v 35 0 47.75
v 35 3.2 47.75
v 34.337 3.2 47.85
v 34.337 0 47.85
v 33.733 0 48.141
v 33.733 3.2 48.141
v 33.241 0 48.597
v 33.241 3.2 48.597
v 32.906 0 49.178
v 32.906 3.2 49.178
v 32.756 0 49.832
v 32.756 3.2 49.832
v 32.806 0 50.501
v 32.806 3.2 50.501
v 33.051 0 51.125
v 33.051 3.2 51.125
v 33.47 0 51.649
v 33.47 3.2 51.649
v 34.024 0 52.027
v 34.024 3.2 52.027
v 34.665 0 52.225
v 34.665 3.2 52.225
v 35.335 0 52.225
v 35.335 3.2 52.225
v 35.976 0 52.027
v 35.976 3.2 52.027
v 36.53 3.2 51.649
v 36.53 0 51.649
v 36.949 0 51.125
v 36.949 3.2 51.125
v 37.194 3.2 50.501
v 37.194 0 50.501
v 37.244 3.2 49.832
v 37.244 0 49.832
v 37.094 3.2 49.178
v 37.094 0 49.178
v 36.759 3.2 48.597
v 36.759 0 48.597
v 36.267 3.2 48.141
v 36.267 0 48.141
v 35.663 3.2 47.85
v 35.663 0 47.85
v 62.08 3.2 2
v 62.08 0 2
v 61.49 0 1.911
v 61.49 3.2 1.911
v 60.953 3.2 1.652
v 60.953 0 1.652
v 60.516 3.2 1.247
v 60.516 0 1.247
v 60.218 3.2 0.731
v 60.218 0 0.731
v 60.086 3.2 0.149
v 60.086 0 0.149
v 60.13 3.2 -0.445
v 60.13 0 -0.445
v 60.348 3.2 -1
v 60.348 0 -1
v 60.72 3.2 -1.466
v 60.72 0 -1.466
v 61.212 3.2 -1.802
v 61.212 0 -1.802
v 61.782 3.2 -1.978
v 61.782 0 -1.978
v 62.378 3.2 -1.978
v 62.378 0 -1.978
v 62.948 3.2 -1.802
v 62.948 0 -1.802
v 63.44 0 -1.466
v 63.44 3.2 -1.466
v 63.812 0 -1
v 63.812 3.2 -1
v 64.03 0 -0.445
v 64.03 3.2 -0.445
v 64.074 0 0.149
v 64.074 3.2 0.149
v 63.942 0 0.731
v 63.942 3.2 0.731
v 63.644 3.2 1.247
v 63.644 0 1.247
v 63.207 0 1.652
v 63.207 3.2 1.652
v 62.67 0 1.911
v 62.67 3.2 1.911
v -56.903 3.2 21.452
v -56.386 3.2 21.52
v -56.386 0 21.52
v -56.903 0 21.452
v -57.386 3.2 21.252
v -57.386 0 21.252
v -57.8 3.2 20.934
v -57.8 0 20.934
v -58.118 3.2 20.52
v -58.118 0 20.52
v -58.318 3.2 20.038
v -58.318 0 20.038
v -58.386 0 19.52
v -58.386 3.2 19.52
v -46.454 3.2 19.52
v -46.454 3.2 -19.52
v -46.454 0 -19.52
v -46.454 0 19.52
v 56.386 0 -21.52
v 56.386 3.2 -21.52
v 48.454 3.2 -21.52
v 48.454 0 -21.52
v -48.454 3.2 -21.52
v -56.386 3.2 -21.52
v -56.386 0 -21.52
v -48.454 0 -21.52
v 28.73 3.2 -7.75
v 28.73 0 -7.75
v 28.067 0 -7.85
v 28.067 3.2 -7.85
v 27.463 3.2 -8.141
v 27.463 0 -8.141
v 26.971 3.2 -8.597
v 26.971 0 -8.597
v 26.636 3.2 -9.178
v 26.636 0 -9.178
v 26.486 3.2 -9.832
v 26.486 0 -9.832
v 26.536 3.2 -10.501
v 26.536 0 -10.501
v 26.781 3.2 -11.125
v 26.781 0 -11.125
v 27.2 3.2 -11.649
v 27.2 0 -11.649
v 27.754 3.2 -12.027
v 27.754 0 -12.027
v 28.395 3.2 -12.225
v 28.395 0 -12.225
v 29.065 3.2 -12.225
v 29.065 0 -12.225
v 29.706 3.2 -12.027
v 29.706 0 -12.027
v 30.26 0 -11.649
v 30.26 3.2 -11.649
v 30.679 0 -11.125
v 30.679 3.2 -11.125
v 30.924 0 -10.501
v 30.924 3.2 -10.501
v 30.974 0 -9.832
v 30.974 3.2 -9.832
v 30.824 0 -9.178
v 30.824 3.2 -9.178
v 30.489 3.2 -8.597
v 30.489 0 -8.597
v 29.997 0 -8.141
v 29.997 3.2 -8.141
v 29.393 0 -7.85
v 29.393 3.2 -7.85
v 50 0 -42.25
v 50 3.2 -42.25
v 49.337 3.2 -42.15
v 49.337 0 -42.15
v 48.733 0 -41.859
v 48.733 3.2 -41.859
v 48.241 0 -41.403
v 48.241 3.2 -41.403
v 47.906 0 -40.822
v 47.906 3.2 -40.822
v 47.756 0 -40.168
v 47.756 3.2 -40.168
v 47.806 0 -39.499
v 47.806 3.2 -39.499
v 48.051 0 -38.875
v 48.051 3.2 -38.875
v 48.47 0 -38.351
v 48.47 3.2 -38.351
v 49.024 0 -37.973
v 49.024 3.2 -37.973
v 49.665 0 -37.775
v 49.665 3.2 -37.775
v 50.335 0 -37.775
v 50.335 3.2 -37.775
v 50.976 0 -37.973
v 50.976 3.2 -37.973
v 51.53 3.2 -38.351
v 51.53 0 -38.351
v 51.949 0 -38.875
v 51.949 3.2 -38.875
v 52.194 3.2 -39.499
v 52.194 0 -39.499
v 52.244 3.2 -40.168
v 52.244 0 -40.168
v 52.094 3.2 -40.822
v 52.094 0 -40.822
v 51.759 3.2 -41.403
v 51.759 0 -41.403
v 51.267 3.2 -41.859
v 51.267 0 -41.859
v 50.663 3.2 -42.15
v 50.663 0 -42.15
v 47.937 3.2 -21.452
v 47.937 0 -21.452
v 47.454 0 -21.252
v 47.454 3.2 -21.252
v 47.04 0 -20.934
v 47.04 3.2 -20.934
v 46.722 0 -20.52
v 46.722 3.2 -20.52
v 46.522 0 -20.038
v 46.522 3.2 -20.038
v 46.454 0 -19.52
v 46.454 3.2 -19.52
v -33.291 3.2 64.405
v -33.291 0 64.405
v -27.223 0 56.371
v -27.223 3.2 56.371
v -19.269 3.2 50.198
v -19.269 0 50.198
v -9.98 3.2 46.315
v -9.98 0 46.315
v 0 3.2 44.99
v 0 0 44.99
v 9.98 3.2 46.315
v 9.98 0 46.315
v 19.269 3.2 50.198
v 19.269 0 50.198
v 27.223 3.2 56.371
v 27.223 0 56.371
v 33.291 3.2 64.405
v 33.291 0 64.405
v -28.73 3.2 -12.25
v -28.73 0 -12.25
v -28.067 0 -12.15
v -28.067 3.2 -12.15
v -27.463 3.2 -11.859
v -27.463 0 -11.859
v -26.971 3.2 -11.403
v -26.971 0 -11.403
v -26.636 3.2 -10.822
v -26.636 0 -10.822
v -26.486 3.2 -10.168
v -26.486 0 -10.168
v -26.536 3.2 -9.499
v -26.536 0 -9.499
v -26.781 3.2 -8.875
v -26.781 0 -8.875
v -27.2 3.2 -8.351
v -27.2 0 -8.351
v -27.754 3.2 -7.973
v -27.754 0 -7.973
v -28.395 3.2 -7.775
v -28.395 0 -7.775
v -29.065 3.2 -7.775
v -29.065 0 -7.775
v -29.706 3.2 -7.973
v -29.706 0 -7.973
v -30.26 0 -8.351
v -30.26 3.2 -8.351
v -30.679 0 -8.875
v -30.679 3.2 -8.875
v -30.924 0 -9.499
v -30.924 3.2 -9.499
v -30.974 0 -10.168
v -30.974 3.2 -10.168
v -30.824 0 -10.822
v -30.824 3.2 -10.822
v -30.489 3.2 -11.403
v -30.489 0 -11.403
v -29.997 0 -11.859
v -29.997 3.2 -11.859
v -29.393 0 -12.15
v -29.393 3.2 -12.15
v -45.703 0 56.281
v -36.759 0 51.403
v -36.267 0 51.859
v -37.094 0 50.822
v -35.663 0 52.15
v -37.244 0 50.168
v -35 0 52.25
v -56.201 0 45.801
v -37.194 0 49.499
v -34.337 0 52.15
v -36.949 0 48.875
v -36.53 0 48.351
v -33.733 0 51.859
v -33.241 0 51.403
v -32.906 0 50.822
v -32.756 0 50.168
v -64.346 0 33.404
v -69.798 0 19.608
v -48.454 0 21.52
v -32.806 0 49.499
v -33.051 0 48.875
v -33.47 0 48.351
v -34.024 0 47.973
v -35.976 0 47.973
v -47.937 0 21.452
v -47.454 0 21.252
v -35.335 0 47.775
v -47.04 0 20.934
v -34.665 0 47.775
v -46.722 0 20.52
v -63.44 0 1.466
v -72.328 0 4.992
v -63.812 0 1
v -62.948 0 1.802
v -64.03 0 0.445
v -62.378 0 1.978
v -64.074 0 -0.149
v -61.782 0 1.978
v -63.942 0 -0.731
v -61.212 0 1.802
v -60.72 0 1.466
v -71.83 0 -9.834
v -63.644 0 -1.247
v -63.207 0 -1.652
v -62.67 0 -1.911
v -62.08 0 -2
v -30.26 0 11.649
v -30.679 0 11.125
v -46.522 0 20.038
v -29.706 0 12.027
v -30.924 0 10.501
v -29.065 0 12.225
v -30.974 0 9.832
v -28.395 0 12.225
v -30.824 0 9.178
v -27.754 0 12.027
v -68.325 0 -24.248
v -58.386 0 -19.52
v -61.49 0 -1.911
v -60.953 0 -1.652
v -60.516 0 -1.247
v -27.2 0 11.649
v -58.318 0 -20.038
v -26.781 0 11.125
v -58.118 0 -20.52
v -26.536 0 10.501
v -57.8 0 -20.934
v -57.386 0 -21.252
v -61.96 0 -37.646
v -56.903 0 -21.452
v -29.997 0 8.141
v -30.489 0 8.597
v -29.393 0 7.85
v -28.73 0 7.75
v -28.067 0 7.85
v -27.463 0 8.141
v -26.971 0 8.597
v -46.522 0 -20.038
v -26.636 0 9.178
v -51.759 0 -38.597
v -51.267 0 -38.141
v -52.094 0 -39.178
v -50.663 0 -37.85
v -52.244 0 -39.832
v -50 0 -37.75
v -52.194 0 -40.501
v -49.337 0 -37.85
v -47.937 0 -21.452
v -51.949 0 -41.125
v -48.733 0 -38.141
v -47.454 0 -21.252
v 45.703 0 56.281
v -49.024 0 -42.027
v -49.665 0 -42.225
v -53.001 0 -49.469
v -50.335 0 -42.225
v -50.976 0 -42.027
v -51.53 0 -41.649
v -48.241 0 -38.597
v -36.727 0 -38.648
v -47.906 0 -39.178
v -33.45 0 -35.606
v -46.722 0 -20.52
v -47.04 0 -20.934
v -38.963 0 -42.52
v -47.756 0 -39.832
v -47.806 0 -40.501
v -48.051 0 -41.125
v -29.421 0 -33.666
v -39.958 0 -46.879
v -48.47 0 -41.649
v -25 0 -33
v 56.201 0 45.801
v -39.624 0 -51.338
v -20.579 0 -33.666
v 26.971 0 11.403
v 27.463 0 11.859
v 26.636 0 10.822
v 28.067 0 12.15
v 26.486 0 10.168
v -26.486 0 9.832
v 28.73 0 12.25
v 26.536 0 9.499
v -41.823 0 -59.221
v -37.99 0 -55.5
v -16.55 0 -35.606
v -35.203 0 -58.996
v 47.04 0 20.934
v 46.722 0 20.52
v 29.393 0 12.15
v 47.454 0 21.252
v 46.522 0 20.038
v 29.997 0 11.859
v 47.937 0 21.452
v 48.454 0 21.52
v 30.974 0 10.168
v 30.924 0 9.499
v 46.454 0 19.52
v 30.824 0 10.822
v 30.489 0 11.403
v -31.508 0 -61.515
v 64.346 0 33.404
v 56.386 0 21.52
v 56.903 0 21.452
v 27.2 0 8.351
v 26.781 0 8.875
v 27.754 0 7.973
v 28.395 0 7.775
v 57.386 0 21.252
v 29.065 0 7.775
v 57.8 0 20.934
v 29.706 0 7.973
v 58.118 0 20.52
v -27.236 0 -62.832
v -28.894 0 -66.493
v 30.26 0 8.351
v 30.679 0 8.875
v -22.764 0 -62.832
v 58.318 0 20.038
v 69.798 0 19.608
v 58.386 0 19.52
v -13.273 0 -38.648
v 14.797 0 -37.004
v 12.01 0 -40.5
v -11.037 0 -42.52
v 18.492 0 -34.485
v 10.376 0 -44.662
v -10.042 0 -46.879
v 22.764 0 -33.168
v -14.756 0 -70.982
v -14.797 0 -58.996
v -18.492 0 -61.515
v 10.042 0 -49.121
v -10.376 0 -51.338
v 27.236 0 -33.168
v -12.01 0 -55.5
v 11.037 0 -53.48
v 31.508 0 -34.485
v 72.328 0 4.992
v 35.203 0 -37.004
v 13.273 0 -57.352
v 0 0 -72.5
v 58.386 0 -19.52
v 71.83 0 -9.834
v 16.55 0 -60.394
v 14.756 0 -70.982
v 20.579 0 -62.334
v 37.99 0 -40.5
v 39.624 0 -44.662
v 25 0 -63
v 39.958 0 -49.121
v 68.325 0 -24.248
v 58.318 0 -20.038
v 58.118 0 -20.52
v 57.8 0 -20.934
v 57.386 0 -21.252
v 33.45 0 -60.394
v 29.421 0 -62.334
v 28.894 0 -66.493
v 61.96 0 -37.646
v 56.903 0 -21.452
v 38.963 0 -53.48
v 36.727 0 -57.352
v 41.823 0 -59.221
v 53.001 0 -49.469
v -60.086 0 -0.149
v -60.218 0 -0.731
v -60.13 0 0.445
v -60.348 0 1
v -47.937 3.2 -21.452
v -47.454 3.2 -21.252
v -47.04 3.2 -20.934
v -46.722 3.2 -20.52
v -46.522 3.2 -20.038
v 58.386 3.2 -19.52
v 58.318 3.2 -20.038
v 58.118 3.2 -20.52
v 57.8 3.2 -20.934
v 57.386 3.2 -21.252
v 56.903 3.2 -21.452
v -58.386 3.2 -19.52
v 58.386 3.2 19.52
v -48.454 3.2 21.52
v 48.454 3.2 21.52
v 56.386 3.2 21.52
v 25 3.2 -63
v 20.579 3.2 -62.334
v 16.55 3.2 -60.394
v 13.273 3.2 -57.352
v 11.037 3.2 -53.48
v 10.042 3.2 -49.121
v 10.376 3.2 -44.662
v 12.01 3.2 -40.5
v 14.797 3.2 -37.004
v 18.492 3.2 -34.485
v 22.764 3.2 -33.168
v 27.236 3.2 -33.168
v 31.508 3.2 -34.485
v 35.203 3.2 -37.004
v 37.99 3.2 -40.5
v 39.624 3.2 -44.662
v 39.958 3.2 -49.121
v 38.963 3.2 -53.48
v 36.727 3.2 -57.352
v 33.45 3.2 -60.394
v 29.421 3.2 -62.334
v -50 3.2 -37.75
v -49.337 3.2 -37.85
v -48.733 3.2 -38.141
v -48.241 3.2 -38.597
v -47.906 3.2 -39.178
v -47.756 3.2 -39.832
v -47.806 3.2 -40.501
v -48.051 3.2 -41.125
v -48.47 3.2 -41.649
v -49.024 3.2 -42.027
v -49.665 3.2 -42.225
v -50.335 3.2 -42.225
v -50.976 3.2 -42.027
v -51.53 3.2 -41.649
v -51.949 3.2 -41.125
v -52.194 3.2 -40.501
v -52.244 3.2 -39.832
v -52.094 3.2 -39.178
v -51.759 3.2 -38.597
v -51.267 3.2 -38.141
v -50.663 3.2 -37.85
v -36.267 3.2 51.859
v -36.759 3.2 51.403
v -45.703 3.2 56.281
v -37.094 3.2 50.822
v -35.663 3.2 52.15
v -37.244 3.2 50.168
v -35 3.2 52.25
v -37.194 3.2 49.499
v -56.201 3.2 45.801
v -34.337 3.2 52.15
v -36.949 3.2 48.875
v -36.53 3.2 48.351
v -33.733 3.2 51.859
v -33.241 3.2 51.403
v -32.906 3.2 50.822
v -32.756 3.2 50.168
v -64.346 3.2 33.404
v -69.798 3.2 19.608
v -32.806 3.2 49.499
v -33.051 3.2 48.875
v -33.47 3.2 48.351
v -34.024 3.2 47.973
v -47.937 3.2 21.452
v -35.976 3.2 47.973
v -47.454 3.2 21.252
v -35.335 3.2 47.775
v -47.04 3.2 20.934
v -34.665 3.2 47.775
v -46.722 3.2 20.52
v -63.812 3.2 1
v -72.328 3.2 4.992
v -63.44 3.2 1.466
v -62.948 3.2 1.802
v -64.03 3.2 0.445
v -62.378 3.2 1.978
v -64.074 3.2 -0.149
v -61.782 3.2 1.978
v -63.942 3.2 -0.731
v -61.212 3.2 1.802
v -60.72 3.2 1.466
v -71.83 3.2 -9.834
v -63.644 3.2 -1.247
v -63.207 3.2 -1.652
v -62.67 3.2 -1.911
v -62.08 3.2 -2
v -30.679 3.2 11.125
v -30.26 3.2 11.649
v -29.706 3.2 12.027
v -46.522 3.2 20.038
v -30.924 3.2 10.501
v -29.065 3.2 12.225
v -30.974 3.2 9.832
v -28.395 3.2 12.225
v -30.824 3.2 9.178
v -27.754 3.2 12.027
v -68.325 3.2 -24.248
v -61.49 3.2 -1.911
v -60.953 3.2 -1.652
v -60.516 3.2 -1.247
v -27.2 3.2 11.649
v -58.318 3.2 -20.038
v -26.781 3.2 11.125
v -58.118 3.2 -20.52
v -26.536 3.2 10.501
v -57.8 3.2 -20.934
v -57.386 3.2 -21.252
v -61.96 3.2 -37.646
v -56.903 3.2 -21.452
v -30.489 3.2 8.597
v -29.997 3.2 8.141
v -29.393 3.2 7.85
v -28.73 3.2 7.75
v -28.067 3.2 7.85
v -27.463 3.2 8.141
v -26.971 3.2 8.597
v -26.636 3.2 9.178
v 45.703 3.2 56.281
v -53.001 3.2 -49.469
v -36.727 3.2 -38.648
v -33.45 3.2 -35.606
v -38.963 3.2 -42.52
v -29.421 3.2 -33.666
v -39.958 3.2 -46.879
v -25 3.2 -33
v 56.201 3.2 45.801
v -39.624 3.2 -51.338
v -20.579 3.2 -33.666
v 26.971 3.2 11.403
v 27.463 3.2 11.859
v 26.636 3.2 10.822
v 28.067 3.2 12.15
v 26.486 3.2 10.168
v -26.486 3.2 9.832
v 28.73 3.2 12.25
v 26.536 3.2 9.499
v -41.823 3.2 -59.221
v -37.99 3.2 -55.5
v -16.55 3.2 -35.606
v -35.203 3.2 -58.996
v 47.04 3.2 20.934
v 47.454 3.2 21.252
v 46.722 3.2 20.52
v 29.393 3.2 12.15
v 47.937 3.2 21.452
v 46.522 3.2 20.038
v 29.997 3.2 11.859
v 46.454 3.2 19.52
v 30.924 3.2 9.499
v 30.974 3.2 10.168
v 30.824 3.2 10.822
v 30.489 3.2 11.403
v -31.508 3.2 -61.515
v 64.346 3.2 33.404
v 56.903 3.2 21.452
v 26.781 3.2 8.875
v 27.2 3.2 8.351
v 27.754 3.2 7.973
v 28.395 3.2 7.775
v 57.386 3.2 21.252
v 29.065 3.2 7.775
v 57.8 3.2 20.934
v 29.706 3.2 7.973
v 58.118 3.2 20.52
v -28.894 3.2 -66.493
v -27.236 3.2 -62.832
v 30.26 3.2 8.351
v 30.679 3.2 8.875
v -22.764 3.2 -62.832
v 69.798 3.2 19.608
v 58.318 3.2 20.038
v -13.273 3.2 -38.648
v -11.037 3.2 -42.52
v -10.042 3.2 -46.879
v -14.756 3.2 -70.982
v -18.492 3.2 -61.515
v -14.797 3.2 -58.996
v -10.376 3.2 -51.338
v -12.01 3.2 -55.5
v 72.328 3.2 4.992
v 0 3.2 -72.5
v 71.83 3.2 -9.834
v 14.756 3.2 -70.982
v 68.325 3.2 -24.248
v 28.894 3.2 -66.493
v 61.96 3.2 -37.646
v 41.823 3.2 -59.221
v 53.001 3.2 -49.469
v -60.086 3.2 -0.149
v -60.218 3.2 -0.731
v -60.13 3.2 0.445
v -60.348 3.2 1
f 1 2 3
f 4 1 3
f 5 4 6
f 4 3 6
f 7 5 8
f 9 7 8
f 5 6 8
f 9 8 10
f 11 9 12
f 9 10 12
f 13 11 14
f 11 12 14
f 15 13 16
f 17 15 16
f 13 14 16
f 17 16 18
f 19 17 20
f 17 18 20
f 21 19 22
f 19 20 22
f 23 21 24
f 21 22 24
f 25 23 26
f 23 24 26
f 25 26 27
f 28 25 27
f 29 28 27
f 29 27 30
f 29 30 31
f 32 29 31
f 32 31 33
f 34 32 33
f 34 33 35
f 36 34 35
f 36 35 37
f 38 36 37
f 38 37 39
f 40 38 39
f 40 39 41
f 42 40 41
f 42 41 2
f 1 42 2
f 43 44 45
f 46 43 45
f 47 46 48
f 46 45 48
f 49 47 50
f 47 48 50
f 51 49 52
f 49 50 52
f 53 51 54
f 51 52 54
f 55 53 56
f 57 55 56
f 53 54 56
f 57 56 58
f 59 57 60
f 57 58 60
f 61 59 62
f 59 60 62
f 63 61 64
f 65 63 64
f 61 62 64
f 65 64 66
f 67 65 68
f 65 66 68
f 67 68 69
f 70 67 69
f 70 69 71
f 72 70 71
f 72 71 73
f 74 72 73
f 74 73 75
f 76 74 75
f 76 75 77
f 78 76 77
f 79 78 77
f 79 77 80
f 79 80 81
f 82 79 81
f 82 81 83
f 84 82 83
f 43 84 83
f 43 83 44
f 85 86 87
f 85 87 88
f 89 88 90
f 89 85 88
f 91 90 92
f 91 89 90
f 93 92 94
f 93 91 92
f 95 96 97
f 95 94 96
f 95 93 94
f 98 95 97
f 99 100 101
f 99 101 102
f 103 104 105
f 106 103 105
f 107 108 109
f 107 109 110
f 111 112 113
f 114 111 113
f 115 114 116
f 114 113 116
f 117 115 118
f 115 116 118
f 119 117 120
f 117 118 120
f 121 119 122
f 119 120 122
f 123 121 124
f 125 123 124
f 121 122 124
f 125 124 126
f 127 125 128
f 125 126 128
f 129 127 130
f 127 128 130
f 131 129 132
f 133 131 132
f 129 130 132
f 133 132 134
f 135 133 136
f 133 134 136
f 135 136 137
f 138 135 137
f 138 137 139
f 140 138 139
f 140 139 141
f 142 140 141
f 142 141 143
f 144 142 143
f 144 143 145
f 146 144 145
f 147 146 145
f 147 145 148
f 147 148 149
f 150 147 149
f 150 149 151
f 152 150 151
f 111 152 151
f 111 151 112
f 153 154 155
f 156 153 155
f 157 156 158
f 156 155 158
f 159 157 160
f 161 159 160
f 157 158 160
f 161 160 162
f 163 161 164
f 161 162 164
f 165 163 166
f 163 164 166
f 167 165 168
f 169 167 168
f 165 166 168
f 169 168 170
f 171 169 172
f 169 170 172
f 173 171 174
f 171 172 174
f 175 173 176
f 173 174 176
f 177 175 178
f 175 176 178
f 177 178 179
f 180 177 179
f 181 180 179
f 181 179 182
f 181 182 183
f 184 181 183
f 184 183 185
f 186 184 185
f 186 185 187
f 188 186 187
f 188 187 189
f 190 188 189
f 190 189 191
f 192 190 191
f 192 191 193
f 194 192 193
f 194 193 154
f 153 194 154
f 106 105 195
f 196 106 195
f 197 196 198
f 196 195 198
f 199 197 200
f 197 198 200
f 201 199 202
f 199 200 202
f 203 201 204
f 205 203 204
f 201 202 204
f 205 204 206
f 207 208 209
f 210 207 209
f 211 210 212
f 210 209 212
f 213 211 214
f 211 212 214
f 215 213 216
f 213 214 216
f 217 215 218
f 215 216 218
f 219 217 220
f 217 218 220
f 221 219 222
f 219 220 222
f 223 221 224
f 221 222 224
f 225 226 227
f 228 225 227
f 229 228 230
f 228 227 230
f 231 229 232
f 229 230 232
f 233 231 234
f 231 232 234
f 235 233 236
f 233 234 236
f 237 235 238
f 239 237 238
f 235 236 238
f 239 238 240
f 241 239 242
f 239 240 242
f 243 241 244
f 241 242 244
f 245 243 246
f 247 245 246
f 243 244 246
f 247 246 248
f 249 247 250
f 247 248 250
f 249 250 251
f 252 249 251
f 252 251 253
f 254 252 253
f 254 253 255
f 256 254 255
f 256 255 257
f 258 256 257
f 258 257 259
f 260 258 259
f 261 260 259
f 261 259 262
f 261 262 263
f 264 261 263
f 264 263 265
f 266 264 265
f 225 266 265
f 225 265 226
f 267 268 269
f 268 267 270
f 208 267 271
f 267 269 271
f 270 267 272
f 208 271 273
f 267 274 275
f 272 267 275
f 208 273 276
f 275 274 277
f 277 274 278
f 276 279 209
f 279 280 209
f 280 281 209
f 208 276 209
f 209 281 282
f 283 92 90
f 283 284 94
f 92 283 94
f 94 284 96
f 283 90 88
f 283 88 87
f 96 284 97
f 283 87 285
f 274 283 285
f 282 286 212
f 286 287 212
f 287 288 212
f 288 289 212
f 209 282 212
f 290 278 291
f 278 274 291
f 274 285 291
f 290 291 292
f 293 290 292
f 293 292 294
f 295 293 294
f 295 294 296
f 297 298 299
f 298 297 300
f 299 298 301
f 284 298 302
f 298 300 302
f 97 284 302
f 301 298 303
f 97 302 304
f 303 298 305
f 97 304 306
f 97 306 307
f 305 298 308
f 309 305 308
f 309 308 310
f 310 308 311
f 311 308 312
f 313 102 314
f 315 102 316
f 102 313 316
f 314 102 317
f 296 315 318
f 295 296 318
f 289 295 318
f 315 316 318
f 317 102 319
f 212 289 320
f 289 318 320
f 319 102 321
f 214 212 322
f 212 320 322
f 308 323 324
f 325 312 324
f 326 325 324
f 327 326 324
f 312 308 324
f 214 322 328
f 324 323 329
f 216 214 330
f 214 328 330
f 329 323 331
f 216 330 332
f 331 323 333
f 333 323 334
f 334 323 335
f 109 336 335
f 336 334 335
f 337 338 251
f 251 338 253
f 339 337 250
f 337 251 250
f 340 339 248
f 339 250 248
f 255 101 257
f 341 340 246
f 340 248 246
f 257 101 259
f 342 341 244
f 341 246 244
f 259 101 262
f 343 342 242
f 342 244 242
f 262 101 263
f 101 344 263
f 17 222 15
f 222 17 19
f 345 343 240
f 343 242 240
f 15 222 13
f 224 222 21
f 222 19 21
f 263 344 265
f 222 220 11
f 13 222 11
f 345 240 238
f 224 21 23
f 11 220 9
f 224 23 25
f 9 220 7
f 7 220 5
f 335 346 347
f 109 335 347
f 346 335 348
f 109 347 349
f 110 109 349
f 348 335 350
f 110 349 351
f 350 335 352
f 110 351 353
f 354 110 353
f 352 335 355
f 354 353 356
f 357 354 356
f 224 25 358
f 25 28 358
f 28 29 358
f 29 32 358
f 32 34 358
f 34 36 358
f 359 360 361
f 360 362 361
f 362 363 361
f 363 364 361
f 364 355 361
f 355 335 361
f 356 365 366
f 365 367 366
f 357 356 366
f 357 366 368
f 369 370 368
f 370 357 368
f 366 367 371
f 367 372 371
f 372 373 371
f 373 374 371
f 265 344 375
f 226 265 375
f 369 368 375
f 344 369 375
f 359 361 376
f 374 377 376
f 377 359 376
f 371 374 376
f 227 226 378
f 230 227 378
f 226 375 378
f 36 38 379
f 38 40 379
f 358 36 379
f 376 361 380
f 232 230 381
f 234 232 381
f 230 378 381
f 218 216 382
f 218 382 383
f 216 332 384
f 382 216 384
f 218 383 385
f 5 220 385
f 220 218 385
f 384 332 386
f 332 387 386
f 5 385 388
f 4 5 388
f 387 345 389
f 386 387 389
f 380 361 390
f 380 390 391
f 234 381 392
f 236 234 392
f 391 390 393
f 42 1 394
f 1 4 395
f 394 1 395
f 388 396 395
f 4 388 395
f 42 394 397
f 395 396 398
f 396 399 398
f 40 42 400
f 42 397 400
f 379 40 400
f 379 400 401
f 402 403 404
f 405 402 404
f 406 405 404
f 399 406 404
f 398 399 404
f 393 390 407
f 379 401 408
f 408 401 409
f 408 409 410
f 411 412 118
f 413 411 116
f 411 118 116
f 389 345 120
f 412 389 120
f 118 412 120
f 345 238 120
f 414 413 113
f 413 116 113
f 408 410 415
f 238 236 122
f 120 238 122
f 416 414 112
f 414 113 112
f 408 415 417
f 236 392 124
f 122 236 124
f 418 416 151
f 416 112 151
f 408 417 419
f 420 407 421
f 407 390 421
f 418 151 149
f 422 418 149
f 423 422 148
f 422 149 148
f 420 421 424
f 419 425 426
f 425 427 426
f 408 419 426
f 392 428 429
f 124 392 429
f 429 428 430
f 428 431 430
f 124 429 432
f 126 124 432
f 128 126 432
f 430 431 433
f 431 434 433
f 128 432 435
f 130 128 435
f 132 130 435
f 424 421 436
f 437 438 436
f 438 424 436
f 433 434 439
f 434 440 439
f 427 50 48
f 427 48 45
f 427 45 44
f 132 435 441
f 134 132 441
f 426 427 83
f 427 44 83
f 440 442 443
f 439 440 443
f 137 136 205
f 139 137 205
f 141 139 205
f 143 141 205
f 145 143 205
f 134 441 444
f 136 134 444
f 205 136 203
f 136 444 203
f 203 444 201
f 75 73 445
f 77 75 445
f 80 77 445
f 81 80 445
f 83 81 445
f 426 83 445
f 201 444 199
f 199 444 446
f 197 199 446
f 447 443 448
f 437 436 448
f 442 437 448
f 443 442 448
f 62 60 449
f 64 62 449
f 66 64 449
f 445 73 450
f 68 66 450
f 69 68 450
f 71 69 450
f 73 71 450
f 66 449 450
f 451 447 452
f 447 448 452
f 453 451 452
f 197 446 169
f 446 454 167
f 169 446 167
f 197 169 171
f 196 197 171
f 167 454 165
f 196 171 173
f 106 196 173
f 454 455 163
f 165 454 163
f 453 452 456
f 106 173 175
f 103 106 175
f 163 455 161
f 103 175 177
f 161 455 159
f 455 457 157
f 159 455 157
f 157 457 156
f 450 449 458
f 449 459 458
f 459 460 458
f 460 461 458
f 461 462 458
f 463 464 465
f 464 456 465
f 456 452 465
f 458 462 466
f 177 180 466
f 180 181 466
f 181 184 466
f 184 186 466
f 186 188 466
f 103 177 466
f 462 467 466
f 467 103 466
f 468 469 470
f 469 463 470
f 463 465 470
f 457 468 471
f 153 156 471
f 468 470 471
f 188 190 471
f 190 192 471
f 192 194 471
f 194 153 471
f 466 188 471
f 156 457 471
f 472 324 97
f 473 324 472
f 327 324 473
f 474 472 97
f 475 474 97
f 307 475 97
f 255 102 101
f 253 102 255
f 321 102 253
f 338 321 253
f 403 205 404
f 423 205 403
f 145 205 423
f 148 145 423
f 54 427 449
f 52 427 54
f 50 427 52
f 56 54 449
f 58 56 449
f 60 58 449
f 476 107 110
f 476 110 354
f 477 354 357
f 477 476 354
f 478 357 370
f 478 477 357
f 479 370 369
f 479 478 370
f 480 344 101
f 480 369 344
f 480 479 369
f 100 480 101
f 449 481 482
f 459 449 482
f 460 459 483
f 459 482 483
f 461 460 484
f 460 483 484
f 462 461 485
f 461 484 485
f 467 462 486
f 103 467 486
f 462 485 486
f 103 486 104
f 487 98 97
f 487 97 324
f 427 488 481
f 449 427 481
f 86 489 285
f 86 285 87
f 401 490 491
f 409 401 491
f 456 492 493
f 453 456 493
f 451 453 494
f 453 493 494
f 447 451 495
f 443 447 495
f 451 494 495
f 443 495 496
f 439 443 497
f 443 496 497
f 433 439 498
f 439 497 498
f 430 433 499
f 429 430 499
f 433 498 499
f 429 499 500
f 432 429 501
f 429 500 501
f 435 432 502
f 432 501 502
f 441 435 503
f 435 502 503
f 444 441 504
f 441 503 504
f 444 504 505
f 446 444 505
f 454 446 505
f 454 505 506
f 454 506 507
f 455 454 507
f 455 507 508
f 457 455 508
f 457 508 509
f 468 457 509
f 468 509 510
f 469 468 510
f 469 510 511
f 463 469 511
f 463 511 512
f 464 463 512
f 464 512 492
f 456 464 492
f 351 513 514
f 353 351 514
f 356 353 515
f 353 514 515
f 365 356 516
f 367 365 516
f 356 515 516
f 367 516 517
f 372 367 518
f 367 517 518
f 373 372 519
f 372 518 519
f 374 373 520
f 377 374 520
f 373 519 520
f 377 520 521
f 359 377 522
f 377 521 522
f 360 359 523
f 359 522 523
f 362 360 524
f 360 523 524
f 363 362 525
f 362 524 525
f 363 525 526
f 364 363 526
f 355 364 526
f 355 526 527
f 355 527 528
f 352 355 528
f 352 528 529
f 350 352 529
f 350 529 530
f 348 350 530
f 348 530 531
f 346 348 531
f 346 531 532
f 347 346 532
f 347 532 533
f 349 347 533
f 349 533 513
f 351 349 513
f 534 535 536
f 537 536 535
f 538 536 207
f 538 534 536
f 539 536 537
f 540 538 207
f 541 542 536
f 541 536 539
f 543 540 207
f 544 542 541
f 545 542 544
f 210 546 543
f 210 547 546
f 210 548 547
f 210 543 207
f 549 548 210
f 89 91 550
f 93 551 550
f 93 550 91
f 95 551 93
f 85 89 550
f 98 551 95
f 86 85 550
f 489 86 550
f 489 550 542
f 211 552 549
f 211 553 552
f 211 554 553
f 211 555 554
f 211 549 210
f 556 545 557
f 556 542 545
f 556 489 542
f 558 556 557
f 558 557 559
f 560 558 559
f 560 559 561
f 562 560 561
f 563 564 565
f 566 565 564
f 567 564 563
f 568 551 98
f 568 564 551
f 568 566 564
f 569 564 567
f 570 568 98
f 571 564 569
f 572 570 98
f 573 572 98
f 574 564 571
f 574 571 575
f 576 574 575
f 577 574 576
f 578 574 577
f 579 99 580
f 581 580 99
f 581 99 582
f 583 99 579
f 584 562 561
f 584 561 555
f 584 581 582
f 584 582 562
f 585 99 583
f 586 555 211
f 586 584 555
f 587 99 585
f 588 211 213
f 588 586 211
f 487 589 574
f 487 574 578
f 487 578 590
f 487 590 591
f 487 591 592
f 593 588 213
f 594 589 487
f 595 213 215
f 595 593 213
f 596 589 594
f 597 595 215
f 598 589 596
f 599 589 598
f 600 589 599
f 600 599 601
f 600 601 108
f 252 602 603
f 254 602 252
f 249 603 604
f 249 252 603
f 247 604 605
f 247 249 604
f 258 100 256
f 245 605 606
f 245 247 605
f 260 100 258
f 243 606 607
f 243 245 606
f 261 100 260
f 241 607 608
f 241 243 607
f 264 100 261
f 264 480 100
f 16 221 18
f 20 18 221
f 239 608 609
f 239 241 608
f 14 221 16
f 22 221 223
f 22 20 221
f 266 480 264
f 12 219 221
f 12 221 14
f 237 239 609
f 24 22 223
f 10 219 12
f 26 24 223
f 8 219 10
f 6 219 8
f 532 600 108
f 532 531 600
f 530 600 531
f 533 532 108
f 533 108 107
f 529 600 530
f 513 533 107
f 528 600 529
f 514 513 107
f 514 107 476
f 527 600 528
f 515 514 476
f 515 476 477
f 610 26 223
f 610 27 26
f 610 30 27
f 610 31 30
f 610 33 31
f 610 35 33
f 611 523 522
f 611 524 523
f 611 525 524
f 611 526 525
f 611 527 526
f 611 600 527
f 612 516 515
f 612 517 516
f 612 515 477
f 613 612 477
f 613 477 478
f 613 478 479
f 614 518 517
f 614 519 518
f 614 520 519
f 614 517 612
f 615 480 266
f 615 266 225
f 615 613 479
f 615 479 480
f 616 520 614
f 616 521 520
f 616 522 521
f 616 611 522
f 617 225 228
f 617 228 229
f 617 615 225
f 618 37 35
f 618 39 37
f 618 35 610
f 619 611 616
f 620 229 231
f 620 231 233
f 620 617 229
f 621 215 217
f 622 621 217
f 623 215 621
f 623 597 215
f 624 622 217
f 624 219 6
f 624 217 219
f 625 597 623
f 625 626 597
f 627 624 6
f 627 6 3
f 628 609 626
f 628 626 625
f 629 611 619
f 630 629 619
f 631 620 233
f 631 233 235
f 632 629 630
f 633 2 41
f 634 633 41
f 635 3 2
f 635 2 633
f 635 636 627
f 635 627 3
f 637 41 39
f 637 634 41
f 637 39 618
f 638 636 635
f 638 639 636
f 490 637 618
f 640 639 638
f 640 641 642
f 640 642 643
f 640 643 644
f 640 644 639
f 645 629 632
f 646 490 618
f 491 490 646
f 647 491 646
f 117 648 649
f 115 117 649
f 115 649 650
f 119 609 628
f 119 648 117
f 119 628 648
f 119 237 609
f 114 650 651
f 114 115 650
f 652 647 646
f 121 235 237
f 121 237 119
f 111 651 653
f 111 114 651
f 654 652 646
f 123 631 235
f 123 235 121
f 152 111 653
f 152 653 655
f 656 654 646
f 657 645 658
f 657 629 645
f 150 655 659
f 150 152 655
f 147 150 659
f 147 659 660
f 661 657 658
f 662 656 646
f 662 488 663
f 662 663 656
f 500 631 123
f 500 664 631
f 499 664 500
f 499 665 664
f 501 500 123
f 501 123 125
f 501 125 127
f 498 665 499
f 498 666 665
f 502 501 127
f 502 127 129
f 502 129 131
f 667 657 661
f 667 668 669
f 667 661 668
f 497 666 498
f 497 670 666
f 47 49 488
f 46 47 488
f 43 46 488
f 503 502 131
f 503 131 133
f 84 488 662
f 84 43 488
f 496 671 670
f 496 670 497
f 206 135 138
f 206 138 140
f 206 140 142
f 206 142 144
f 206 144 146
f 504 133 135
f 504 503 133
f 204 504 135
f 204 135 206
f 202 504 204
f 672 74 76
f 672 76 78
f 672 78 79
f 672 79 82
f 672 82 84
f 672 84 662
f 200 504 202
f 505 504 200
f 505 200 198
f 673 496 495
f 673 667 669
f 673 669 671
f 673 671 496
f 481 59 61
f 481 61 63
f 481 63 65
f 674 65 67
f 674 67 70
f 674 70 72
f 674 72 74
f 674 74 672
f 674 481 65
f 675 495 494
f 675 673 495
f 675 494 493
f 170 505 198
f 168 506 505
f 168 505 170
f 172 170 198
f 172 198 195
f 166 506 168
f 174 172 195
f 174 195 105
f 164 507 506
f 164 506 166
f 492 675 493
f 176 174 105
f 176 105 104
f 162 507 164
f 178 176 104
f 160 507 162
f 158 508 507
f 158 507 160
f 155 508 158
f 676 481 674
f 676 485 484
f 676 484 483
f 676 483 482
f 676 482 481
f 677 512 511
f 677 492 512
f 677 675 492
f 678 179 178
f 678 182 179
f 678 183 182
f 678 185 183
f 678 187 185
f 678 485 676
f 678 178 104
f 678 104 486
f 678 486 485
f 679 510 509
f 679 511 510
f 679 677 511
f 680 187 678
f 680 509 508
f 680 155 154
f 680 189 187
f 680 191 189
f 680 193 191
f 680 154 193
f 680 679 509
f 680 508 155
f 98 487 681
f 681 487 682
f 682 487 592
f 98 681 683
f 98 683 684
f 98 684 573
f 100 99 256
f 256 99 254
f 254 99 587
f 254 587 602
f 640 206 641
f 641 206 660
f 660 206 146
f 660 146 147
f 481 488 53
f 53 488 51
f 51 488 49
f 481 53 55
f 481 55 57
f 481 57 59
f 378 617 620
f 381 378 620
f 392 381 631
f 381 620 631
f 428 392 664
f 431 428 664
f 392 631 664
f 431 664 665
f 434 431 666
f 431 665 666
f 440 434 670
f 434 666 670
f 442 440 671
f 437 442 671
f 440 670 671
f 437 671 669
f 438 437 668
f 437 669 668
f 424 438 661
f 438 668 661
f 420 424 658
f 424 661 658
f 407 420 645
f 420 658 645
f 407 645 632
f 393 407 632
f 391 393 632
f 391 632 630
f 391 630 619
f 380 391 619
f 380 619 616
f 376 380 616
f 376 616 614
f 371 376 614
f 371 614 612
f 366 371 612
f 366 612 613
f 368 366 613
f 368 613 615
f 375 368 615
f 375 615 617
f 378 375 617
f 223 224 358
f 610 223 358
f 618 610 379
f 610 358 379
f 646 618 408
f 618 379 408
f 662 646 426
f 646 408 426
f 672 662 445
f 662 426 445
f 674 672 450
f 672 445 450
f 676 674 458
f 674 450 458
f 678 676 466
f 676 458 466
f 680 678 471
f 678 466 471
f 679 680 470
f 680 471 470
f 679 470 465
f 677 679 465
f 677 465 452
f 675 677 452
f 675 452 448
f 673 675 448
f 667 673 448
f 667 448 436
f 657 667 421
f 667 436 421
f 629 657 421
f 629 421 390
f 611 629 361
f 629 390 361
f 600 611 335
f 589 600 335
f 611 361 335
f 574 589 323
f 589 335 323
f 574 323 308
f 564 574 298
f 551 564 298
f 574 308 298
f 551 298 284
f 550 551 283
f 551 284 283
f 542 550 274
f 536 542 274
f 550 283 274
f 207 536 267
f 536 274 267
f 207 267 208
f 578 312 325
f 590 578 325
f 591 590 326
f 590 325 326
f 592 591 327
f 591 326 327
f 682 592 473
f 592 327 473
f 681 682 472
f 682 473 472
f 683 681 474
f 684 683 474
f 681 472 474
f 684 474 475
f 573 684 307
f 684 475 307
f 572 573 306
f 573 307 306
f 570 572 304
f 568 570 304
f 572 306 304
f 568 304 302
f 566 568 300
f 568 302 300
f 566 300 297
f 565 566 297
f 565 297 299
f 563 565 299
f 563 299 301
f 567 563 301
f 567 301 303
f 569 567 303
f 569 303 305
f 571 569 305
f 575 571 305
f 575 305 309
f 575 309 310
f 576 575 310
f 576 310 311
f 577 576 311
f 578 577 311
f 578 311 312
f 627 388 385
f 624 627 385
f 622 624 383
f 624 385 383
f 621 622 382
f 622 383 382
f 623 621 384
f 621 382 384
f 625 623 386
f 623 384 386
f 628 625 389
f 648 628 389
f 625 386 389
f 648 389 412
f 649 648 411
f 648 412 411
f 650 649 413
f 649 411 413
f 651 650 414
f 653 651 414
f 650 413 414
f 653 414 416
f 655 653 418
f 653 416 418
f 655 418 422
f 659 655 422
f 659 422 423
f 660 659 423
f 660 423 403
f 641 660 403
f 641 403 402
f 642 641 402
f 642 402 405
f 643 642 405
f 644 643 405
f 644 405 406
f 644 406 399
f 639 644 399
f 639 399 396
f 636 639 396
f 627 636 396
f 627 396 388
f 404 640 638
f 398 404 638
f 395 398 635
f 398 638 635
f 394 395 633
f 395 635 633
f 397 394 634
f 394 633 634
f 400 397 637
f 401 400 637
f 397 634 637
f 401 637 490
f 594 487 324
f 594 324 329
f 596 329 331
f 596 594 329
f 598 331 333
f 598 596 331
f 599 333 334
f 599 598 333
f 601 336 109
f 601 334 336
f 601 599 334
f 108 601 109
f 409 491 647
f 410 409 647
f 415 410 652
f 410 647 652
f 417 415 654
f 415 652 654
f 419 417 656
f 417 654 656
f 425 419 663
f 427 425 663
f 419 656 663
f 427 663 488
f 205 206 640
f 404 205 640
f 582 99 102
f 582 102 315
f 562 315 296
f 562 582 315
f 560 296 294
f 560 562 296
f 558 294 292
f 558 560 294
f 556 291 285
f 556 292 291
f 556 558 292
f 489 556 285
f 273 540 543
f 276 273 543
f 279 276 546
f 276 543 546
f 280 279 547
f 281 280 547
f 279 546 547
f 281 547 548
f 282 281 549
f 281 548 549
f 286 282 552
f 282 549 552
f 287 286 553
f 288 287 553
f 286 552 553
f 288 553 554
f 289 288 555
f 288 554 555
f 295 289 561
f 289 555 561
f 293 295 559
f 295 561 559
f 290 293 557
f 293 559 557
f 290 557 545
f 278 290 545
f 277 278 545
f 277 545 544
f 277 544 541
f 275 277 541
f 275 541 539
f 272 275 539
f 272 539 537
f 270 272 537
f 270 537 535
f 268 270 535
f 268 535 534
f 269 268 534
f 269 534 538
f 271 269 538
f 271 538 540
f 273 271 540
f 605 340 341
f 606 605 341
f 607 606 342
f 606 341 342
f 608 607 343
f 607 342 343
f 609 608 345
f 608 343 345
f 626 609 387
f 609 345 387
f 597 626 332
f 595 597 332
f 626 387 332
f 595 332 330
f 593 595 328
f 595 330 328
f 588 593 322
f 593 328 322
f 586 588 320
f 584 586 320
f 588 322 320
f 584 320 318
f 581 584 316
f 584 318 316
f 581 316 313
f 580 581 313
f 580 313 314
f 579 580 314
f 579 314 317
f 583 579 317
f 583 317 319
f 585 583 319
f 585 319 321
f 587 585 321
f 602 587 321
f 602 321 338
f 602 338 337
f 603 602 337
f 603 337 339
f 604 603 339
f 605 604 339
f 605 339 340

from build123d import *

# Parameters (mm, degrees)
BOSS_EXTRUDE1_DEPTH = 3.2
SKETCH2_W           = 10.76
SKETCH2_H           = 41.868700306
CUT_EXTRUDE1_DEPTH  = 103.580407486
SKETCH3_R           = 2
SKETCH3_R_2         = 2.25
CUT_EXTRUDE2_DEPTH  = 103.580407486
SKETCH4_R           = 15
CUT_EXTRUDE3_DEPTH  = 103.580407486
CUT_EXTRUDE4_DEPTH  = 103.580407486
SKETCH6_R           = 2.25
CUT_EXTRUDE5_DEPTH  = 103.580407486


with BuildPart() as part:
    # Sketch1 → Boss-Extrude1 (new body)
    with BuildSketch(Plane(origin=(0, 0, 0), x_dir=(1, 0, 0), z_dir=(0, 1, 0))):
        with BuildLine():
            ThreePointArc((33.29110537, -64.404598464), (0, 72.5), (-33.29110537, -64.404598464))
            ThreePointArc((-33.29110537, -64.404598464), (0, -44.989799638), (33.29110537, -64.404598464))
        make_face()
    extrude(amount=BOSS_EXTRUDE1_DEPTH)

    # Sketch2 → Cut-Extrude1 (cut, through all)
    with BuildSketch(Plane(origin=(0, 3.2, 0), x_dir=(1, 0, 0), z_dir=(0, 1, 0))):
        with Locations((-52.42, 0)):
            Rectangle(SKETCH2_W, SKETCH2_H)
        with Locations((52.42, 0)):
            Rectangle(SKETCH2_W, SKETCH2_H)
    extrude(amount=-CUT_EXTRUDE1_DEPTH, mode=Mode.SUBTRACT)

    # Sketch3 → Cut-Extrude2 (cut, through all)
    with BuildSketch(Plane.XZ):
        with Locations(Location((-62.08, 0, 0), (0, 0, 270))):
            Circle(SKETCH3_R)
        with Locations(Location((-28.73, 10, 0), (0, 0, 270))):
            Circle(SKETCH3_R_2)
        with Locations(Location((-28.73, -10, 0), (0, 0, 270))):
            Circle(SKETCH3_R_2)
        with Locations(Location((28.73, -10, 0), (0, 0, 90))):
            Circle(SKETCH3_R_2)
        with Locations(Location((28.73, 10, 0), (0, 0, 90))):
            Circle(SKETCH3_R_2)
        with Locations(Location((62.08, 0, 0), (0, 0, 90))):
            Circle(SKETCH3_R)
    extrude(amount=-CUT_EXTRUDE2_DEPTH, mode=Mode.SUBTRACT)

    # Sketch4 → Cut-Extrude3 (cut, through all)
    with BuildSketch(Plane(origin=(0, 3.2, 0), x_dir=(1, 0, 0), z_dir=(0, 1, 0))):
        with Locations(Location((-25, 48, 0), (0, 0, 270))):
            Circle(SKETCH4_R)
        with Locations(Location((25, 48, 0), (0, 0, 90))):
            Circle(SKETCH4_R)
    extrude(amount=-CUT_EXTRUDE3_DEPTH, mode=Mode.SUBTRACT)

    # Sketch5 → Cut-Extrude4 (cut, through all)
    with BuildSketch(Plane(origin=(0, 3.2, 0), x_dir=(1, 0, 0), z_dir=(0, 1, 0))):
        with BuildLine():
            Line((-56.385786438, 21.520136591), (-48.454213562, 21.520136591))
            ThreePointArc((-48.454213562, 21.520136591), (-47.04, 20.934350153), (-46.454213562, 19.520136591))
            Line((-46.454213562, 19.520136591), (-46.454213562, -19.520136591))
            ThreePointArc((-46.454213562, -19.520136591), (-47.04, -20.934350153), (-48.454213562, -21.520136591))
            Line((-48.454213562, -21.520136591), (-56.385786438, -21.520136591))
            ThreePointArc((-56.385786438, -21.520136591), (-57.8, -20.934350153), (-58.385786438, -19.520136591))
            Line((-58.385786438, -19.520136591), (-58.385786438, 19.520136591))
            ThreePointArc((-58.385786438, 19.520136591), (-57.8, 20.934350153), (-56.385786438, 21.520136591))
        make_face()
        with BuildLine():
            Line((46.454213562, 19.520136591), (46.454213562, -19.520136591))
            ThreePointArc((46.454213562, -19.520136591), (47.04, -20.934350153), (48.454213562, -21.520136591))
            Line((48.454213562, -21.520136591), (56.385786438, -21.520136591))
            ThreePointArc((56.385786438, -21.520136591), (57.8, -20.934350153), (58.385786438, -19.520136591))
            Line((58.385786438, -19.520136591), (58.385786438, 19.520136591))
            ThreePointArc((58.385786438, 19.520136591), (57.8, 20.934350153), (56.385786438, 21.520136591))
            Line((56.385786438, 21.520136591), (48.454213562, 21.520136591))
            ThreePointArc((48.454213562, 21.520136591), (47.04, 20.934350153), (46.454213562, 19.520136591))
        make_face()
    extrude(amount=-CUT_EXTRUDE4_DEPTH, mode=Mode.SUBTRACT)

    # Sketch6 → Cut-Extrude5 (cut, through all)
    with BuildSketch(Plane(origin=(0, 3.2, 0), x_dir=(1, 0, 0), z_dir=(0, 1, 0))):
        with Locations(Location((-50, 40, 0), (0, 0, 270))):
            Circle(SKETCH6_R)
        with Locations(Location((-35, -50, 0), (0, 0, 270))):
            Circle(SKETCH6_R)
        with Locations(Location((35, -50, 0), (0, 0, 90))):
            Circle(SKETCH6_R)
        with Locations(Location((50, 40, 0), (0, 0, 90))):
            Circle(SKETCH6_R)
    extrude(amount=-CUT_EXTRUDE5_DEPTH, mode=Mode.SUBTRACT)


solid = part.part
